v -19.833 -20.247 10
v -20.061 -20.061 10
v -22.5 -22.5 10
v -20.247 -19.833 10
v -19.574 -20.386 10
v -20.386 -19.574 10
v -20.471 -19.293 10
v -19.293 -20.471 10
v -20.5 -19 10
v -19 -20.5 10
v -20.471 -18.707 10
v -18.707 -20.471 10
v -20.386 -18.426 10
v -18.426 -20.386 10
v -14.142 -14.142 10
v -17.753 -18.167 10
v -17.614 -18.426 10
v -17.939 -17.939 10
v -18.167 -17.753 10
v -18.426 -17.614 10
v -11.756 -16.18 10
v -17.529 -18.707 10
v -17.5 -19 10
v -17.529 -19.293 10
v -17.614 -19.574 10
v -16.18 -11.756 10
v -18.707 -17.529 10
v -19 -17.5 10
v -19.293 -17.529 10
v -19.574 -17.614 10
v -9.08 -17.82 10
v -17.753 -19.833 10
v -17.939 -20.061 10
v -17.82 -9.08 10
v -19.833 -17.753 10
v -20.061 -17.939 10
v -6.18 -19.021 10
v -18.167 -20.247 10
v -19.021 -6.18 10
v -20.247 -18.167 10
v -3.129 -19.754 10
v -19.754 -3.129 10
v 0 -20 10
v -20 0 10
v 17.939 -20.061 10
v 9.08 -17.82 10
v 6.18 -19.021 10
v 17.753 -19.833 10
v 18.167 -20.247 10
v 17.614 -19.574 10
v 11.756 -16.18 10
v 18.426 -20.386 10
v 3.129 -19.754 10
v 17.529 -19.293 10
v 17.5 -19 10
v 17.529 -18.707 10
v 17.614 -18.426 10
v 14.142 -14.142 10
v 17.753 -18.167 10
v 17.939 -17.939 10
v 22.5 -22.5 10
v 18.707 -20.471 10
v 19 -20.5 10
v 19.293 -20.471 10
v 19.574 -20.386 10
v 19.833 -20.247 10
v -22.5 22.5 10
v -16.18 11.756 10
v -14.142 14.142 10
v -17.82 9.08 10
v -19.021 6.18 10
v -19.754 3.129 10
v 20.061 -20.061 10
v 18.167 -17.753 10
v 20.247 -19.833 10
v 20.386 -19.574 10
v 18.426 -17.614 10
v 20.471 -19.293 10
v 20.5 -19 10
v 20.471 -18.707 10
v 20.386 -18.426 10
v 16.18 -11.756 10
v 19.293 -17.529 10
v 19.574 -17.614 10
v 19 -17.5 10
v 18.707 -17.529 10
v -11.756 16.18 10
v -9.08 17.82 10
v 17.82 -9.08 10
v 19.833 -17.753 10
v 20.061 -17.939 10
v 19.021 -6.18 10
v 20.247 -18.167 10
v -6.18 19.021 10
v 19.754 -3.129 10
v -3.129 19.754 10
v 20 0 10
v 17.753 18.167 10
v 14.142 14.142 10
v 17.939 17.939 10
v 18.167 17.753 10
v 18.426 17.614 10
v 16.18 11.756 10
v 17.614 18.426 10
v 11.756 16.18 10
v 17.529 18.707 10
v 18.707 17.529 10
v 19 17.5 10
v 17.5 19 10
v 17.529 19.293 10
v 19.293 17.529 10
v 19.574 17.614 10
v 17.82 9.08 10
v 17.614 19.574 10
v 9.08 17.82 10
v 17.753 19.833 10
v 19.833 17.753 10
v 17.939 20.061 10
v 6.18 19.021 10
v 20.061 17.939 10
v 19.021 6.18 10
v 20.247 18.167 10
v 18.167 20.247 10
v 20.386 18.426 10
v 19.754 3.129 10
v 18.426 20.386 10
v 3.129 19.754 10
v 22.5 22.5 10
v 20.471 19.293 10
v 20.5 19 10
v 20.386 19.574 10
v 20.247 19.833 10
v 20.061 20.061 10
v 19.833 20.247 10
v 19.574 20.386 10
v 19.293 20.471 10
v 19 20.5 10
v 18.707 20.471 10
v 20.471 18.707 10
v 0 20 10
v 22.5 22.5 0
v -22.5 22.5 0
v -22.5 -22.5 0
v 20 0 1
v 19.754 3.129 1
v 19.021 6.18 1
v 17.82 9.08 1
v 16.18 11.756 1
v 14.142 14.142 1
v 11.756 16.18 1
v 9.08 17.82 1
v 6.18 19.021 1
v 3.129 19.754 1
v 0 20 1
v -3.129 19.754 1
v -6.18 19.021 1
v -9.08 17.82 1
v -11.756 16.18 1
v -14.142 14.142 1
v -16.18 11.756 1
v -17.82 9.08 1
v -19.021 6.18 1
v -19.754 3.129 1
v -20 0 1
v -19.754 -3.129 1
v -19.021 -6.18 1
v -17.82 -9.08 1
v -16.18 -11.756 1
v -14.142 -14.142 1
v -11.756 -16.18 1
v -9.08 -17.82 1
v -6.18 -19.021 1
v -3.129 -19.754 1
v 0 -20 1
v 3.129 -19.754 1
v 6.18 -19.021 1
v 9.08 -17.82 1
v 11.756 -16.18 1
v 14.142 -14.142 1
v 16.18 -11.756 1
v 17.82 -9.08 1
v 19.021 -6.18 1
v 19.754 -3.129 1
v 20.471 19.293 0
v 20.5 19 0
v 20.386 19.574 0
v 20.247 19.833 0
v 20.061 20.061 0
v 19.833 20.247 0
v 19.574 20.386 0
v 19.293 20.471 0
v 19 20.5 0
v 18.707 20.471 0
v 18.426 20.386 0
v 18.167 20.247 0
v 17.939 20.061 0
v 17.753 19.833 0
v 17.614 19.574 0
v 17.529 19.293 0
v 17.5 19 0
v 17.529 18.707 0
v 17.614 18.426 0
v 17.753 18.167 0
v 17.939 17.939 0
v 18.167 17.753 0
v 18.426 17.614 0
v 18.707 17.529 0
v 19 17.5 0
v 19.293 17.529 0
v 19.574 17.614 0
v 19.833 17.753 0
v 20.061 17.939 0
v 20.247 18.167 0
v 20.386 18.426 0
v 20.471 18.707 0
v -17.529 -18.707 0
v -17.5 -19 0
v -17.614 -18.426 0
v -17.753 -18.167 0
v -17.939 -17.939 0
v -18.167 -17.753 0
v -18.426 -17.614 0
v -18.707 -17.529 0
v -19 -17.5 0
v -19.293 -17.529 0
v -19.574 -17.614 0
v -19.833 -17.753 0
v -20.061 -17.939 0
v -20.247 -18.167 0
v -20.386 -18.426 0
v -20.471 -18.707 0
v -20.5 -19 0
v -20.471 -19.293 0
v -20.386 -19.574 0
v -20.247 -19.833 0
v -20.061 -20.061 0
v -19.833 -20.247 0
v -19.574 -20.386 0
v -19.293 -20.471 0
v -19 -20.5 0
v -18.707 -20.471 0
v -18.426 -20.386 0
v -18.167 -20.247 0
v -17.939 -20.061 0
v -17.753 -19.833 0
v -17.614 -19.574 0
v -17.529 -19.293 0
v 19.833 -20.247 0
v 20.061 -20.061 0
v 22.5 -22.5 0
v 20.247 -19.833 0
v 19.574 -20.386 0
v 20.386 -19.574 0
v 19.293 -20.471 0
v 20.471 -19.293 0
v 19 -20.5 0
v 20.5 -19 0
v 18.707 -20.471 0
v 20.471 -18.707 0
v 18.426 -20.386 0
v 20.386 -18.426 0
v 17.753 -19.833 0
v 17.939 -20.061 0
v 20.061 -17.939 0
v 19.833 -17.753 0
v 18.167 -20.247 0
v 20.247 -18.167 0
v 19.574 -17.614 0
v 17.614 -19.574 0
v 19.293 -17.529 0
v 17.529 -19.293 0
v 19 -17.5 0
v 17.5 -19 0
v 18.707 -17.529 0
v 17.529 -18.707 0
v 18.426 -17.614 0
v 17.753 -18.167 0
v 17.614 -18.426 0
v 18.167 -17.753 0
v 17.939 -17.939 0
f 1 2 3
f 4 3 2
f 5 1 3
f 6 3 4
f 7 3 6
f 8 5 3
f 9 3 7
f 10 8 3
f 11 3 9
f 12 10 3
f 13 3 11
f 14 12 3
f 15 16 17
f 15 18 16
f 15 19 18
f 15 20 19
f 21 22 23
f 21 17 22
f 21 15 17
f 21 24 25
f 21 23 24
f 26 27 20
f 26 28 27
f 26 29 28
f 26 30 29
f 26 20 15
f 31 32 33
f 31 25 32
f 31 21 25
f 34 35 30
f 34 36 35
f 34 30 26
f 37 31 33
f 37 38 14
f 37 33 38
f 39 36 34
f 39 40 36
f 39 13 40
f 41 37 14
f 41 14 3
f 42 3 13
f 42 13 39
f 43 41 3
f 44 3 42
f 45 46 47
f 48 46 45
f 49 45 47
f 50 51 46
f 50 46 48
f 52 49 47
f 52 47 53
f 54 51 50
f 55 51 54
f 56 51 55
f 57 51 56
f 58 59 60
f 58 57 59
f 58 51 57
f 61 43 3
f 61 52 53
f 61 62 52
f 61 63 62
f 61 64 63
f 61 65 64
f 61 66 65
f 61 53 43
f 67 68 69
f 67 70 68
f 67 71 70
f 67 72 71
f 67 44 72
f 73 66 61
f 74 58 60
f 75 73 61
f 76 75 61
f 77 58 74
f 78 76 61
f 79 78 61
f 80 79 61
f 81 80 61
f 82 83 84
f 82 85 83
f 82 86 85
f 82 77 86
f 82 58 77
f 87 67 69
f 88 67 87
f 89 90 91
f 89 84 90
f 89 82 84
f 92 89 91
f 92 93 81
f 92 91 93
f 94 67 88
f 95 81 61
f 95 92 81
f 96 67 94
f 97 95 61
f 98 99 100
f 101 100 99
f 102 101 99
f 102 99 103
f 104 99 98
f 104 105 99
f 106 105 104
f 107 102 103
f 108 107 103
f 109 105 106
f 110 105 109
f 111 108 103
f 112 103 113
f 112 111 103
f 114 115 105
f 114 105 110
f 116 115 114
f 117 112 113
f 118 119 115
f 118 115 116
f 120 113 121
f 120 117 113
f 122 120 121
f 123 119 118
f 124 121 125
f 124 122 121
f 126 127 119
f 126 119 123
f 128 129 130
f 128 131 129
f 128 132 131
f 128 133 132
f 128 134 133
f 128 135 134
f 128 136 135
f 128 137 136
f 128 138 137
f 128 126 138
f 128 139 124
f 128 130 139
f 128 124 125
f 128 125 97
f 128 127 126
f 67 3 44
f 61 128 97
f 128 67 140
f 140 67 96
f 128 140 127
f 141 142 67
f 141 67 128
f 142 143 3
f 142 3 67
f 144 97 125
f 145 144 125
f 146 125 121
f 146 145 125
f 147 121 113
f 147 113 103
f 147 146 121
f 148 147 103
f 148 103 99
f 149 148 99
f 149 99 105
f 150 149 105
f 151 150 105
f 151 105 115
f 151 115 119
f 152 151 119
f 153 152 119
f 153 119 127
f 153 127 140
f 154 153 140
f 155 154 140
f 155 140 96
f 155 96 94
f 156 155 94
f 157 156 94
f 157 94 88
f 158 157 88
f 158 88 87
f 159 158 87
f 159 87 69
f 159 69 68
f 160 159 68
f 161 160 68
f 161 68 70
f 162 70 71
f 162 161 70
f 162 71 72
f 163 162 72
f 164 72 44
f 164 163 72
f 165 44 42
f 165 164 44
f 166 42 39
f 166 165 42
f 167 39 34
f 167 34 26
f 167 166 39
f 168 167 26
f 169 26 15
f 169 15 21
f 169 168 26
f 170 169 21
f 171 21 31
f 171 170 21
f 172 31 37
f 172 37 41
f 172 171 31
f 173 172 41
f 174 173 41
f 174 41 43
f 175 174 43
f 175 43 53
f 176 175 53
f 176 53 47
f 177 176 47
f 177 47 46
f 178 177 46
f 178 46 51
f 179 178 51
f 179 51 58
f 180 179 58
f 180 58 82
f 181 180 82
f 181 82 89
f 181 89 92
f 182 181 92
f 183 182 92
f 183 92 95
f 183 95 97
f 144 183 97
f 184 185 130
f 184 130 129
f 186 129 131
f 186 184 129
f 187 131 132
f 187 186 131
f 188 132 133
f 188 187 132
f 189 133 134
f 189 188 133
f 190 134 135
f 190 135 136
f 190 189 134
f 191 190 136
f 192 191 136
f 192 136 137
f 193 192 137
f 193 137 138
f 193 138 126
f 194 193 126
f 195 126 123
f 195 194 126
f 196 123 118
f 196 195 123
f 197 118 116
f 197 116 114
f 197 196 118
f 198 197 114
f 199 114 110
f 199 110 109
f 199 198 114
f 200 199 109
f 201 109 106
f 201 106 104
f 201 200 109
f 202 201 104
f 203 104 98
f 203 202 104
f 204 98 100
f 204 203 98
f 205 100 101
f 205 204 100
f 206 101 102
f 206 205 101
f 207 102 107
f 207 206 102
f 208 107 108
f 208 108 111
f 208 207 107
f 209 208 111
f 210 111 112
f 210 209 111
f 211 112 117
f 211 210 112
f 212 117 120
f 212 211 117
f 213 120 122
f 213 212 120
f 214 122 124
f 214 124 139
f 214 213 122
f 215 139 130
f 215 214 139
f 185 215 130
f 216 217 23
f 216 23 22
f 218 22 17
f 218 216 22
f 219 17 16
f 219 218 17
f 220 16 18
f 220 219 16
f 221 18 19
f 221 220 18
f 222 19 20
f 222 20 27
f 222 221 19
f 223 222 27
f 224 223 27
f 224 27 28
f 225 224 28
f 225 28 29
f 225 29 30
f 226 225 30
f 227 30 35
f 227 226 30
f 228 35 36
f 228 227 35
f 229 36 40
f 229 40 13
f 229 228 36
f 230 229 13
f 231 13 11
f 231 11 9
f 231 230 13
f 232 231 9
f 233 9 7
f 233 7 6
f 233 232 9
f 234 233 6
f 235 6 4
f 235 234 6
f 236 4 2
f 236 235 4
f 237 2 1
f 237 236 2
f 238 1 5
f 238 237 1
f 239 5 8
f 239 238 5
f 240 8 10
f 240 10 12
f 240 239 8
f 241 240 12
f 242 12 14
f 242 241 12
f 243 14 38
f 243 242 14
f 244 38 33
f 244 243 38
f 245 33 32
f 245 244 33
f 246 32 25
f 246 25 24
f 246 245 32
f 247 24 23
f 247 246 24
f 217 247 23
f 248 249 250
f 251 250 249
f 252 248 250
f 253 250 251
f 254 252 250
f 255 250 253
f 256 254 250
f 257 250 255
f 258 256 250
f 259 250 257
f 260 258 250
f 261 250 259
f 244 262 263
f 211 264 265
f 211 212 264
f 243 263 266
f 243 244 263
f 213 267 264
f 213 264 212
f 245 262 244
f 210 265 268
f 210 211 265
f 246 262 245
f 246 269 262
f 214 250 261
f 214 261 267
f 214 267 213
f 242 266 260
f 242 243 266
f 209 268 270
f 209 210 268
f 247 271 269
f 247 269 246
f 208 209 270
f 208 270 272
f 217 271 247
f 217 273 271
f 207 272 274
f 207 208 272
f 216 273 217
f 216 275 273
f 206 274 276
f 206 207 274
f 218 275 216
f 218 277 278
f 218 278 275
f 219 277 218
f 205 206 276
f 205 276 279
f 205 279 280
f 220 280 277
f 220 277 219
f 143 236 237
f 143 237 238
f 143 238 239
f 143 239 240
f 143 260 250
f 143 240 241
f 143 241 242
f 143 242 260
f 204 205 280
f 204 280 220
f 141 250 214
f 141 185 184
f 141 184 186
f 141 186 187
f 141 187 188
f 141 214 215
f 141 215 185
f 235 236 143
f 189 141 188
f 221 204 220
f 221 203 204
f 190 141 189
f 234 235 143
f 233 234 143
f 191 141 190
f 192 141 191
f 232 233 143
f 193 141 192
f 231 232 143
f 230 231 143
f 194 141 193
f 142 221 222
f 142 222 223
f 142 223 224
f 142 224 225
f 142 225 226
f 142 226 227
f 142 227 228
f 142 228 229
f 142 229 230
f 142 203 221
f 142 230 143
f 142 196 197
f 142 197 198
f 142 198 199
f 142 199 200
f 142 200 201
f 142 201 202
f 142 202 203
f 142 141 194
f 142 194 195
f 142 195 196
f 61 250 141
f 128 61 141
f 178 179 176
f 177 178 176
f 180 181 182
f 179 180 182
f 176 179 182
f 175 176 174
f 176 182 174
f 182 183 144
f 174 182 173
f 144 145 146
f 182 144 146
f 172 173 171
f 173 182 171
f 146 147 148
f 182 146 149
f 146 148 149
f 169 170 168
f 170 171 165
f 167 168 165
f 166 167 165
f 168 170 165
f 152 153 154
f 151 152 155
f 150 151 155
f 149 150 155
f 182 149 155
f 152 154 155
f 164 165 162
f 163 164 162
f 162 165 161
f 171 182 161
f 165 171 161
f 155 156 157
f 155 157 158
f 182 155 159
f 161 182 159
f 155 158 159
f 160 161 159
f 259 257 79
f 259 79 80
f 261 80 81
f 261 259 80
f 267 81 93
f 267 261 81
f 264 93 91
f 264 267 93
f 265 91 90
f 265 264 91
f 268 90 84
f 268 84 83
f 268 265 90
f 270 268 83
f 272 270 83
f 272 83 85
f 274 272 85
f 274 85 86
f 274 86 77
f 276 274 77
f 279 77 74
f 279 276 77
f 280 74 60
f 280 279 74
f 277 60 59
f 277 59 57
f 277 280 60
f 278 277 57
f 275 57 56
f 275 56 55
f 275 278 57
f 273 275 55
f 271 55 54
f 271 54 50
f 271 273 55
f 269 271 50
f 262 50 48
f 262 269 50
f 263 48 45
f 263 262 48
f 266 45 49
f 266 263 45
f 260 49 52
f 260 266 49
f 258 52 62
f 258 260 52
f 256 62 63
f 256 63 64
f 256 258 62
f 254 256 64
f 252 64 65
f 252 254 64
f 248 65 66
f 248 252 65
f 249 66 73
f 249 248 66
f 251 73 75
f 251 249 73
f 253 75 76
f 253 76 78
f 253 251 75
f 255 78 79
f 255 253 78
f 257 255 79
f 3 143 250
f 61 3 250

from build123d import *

# Parameters (mm, degrees)
SKETCH_1_W      = 45
SKETCH_1_H      = 45
SKETCH_1_R      = 1.5
SKETCH_1_R_2    = 20
EXTRUDE_1_DEPTH = 10
SKETCH_2_R      = 20
EXTRUDE_2_DEPTH = 1


with BuildPart() as part:
    # 草圖1 → 填料-伸長1 (new body)
    with BuildSketch(Plane.XY):
        Rectangle(SKETCH_1_W, SKETCH_1_H)
        with Locations((19, 19)):
            Circle(SKETCH_1_R, mode=Mode.SUBTRACT)
        with Locations((19, -19)):
            Circle(SKETCH_1_R, mode=Mode.SUBTRACT)
        with Locations((-19, -19)):
            Circle(SKETCH_1_R, mode=Mode.SUBTRACT)
        Circle(SKETCH_1_R_2, mode=Mode.SUBTRACT)
    extrude(amount=EXTRUDE_1_DEPTH)

    # 草圖2 → 填料-伸長2 (add)
    with BuildSketch(Plane(origin=(0, 0, 0), x_dir=(-1, 0, 0), z_dir=(0, 0, -1))):
        Circle(SKETCH_2_R)
    extrude(amount=-EXTRUDE_2_DEPTH)


solid = part.part
